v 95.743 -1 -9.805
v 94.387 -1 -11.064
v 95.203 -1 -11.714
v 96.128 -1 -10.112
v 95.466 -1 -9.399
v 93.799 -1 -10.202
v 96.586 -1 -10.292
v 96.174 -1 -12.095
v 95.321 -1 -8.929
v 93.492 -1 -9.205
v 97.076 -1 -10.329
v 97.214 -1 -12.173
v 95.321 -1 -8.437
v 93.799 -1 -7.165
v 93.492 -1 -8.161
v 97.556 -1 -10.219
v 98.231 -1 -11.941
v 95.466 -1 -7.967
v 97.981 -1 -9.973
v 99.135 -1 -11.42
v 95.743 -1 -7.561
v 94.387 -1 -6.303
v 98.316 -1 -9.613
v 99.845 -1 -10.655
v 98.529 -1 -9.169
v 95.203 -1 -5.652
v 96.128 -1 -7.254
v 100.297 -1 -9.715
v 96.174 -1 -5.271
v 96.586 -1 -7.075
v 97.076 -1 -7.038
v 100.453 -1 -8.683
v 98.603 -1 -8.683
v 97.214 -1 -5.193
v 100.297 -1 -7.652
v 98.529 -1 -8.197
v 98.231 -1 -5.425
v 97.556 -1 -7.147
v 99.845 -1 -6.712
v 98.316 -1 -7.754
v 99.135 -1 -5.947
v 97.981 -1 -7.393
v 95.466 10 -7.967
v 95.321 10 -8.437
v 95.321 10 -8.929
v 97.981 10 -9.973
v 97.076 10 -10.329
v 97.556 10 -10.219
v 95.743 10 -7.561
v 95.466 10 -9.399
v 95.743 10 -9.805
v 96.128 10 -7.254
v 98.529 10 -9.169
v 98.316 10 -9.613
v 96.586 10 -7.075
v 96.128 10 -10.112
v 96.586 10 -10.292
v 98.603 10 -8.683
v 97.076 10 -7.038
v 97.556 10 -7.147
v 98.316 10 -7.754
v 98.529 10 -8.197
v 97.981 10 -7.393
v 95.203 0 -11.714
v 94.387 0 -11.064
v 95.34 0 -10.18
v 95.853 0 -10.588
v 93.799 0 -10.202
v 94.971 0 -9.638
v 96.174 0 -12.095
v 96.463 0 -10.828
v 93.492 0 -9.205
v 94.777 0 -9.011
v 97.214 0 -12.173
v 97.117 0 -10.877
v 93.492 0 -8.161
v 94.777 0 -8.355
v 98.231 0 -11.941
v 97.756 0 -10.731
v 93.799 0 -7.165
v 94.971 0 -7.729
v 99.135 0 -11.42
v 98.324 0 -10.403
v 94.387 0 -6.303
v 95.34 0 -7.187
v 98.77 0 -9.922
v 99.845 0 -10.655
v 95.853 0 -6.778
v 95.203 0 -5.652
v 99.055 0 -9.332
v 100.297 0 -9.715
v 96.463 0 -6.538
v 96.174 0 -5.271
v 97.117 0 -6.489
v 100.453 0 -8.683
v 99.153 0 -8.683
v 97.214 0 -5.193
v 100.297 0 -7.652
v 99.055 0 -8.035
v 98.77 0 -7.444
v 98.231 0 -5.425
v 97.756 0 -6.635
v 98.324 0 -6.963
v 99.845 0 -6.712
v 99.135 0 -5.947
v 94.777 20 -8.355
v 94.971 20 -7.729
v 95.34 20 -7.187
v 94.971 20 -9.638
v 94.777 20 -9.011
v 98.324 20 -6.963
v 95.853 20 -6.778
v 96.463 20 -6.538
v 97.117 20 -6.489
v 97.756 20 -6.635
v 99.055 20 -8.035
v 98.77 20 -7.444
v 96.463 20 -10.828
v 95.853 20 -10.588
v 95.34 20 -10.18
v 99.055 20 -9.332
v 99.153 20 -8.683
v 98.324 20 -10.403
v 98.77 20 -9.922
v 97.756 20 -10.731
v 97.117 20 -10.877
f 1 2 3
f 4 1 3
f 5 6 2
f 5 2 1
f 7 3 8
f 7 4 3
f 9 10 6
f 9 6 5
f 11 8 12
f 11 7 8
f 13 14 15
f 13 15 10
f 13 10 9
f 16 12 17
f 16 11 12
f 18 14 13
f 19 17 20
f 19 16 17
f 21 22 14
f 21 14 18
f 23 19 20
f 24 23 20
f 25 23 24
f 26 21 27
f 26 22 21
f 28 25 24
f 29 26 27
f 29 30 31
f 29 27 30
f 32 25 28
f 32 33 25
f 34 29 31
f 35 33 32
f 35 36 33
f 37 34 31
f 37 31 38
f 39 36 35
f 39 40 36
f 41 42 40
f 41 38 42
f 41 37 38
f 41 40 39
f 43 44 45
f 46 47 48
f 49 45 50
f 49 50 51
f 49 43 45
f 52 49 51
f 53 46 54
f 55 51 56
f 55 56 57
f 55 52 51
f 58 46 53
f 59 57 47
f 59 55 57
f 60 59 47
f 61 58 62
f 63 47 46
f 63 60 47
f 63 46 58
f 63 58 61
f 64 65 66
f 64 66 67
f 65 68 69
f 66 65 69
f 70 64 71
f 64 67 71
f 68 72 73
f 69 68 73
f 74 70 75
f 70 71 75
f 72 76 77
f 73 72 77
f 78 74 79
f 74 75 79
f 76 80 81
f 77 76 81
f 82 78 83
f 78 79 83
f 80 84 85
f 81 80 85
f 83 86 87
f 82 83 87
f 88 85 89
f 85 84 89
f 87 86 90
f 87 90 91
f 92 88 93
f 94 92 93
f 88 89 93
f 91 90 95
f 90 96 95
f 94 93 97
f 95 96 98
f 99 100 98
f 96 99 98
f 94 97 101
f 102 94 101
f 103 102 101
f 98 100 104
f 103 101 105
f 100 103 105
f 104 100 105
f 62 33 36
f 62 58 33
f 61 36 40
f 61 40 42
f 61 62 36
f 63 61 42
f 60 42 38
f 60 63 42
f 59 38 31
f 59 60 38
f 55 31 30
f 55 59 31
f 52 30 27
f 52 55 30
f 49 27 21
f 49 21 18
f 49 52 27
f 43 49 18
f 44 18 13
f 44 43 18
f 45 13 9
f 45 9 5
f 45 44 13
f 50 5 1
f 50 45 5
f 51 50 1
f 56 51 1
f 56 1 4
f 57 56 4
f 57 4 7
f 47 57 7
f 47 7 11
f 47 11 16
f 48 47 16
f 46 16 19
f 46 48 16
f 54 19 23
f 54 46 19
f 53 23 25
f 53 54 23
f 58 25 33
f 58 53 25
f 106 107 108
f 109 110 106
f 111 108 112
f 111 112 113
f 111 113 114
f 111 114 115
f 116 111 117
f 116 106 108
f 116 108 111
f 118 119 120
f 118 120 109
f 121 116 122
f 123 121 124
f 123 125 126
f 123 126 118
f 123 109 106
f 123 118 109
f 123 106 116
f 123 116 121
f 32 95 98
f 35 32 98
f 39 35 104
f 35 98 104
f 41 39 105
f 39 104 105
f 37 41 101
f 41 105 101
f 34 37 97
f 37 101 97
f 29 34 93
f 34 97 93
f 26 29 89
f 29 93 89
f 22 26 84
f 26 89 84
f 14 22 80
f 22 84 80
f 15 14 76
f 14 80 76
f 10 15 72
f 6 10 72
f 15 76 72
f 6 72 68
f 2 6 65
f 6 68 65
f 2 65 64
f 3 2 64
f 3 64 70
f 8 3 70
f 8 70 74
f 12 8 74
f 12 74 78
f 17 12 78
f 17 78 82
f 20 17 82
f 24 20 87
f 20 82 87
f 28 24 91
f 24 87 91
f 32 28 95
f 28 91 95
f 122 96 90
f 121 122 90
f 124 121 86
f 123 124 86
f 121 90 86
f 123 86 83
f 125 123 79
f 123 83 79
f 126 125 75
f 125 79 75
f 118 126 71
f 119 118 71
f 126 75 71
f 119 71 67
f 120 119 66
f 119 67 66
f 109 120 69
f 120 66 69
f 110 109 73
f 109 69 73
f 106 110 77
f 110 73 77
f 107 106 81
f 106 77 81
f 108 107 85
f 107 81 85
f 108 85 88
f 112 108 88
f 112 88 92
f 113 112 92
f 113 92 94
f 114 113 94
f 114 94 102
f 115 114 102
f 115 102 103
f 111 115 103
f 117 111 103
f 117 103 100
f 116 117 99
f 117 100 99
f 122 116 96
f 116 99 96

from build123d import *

# Parameters (mm, degrees)
SKETCH_2_R          = 3.5
SKETCH_2_R_2        = 1.65
EXTRUDE_1_DEPTH     = 1
SKETCH_3_R          = 2.2
EXTRUDE_2_DEPTH     = 20
SKETCH_6_R          = 1.65
CUT_EXTRUDE_1_DEPTH = 10


with BuildPart() as part:
    # 草图2 → 凸台-拉伸1 (new body)
    with BuildSketch(Plane.XZ):
        with Locations((96.952704723, -8.683144071)):
            Circle(SKETCH_2_R)
        with Locations((96.952704723, -8.683144071)):
            Circle(SKETCH_2_R_2, mode=Mode.SUBTRACT)
    extrude(amount=EXTRUDE_1_DEPTH)

    # 草图3 → 凸台-拉伸2 (add)
    with BuildSketch(Plane(origin=(0, 0, 0), x_dir=(1, 0, 0), z_dir=(0, 1, 0))):
        with Locations((96.952704723, 8.683144071)):
            Circle(SKETCH_3_R)
    extrude(amount=EXTRUDE_2_DEPTH)

    # 草图6 → 切除-拉伸1 (cut)
    with BuildSketch(Plane.XZ):
        with Locations((96.952704723, -8.683144071)):
            Circle(SKETCH_6_R)
    extrude(amount=-CUT_EXTRUDE_1_DEPTH, mode=Mode.SUBTRACT)


solid = part.part
